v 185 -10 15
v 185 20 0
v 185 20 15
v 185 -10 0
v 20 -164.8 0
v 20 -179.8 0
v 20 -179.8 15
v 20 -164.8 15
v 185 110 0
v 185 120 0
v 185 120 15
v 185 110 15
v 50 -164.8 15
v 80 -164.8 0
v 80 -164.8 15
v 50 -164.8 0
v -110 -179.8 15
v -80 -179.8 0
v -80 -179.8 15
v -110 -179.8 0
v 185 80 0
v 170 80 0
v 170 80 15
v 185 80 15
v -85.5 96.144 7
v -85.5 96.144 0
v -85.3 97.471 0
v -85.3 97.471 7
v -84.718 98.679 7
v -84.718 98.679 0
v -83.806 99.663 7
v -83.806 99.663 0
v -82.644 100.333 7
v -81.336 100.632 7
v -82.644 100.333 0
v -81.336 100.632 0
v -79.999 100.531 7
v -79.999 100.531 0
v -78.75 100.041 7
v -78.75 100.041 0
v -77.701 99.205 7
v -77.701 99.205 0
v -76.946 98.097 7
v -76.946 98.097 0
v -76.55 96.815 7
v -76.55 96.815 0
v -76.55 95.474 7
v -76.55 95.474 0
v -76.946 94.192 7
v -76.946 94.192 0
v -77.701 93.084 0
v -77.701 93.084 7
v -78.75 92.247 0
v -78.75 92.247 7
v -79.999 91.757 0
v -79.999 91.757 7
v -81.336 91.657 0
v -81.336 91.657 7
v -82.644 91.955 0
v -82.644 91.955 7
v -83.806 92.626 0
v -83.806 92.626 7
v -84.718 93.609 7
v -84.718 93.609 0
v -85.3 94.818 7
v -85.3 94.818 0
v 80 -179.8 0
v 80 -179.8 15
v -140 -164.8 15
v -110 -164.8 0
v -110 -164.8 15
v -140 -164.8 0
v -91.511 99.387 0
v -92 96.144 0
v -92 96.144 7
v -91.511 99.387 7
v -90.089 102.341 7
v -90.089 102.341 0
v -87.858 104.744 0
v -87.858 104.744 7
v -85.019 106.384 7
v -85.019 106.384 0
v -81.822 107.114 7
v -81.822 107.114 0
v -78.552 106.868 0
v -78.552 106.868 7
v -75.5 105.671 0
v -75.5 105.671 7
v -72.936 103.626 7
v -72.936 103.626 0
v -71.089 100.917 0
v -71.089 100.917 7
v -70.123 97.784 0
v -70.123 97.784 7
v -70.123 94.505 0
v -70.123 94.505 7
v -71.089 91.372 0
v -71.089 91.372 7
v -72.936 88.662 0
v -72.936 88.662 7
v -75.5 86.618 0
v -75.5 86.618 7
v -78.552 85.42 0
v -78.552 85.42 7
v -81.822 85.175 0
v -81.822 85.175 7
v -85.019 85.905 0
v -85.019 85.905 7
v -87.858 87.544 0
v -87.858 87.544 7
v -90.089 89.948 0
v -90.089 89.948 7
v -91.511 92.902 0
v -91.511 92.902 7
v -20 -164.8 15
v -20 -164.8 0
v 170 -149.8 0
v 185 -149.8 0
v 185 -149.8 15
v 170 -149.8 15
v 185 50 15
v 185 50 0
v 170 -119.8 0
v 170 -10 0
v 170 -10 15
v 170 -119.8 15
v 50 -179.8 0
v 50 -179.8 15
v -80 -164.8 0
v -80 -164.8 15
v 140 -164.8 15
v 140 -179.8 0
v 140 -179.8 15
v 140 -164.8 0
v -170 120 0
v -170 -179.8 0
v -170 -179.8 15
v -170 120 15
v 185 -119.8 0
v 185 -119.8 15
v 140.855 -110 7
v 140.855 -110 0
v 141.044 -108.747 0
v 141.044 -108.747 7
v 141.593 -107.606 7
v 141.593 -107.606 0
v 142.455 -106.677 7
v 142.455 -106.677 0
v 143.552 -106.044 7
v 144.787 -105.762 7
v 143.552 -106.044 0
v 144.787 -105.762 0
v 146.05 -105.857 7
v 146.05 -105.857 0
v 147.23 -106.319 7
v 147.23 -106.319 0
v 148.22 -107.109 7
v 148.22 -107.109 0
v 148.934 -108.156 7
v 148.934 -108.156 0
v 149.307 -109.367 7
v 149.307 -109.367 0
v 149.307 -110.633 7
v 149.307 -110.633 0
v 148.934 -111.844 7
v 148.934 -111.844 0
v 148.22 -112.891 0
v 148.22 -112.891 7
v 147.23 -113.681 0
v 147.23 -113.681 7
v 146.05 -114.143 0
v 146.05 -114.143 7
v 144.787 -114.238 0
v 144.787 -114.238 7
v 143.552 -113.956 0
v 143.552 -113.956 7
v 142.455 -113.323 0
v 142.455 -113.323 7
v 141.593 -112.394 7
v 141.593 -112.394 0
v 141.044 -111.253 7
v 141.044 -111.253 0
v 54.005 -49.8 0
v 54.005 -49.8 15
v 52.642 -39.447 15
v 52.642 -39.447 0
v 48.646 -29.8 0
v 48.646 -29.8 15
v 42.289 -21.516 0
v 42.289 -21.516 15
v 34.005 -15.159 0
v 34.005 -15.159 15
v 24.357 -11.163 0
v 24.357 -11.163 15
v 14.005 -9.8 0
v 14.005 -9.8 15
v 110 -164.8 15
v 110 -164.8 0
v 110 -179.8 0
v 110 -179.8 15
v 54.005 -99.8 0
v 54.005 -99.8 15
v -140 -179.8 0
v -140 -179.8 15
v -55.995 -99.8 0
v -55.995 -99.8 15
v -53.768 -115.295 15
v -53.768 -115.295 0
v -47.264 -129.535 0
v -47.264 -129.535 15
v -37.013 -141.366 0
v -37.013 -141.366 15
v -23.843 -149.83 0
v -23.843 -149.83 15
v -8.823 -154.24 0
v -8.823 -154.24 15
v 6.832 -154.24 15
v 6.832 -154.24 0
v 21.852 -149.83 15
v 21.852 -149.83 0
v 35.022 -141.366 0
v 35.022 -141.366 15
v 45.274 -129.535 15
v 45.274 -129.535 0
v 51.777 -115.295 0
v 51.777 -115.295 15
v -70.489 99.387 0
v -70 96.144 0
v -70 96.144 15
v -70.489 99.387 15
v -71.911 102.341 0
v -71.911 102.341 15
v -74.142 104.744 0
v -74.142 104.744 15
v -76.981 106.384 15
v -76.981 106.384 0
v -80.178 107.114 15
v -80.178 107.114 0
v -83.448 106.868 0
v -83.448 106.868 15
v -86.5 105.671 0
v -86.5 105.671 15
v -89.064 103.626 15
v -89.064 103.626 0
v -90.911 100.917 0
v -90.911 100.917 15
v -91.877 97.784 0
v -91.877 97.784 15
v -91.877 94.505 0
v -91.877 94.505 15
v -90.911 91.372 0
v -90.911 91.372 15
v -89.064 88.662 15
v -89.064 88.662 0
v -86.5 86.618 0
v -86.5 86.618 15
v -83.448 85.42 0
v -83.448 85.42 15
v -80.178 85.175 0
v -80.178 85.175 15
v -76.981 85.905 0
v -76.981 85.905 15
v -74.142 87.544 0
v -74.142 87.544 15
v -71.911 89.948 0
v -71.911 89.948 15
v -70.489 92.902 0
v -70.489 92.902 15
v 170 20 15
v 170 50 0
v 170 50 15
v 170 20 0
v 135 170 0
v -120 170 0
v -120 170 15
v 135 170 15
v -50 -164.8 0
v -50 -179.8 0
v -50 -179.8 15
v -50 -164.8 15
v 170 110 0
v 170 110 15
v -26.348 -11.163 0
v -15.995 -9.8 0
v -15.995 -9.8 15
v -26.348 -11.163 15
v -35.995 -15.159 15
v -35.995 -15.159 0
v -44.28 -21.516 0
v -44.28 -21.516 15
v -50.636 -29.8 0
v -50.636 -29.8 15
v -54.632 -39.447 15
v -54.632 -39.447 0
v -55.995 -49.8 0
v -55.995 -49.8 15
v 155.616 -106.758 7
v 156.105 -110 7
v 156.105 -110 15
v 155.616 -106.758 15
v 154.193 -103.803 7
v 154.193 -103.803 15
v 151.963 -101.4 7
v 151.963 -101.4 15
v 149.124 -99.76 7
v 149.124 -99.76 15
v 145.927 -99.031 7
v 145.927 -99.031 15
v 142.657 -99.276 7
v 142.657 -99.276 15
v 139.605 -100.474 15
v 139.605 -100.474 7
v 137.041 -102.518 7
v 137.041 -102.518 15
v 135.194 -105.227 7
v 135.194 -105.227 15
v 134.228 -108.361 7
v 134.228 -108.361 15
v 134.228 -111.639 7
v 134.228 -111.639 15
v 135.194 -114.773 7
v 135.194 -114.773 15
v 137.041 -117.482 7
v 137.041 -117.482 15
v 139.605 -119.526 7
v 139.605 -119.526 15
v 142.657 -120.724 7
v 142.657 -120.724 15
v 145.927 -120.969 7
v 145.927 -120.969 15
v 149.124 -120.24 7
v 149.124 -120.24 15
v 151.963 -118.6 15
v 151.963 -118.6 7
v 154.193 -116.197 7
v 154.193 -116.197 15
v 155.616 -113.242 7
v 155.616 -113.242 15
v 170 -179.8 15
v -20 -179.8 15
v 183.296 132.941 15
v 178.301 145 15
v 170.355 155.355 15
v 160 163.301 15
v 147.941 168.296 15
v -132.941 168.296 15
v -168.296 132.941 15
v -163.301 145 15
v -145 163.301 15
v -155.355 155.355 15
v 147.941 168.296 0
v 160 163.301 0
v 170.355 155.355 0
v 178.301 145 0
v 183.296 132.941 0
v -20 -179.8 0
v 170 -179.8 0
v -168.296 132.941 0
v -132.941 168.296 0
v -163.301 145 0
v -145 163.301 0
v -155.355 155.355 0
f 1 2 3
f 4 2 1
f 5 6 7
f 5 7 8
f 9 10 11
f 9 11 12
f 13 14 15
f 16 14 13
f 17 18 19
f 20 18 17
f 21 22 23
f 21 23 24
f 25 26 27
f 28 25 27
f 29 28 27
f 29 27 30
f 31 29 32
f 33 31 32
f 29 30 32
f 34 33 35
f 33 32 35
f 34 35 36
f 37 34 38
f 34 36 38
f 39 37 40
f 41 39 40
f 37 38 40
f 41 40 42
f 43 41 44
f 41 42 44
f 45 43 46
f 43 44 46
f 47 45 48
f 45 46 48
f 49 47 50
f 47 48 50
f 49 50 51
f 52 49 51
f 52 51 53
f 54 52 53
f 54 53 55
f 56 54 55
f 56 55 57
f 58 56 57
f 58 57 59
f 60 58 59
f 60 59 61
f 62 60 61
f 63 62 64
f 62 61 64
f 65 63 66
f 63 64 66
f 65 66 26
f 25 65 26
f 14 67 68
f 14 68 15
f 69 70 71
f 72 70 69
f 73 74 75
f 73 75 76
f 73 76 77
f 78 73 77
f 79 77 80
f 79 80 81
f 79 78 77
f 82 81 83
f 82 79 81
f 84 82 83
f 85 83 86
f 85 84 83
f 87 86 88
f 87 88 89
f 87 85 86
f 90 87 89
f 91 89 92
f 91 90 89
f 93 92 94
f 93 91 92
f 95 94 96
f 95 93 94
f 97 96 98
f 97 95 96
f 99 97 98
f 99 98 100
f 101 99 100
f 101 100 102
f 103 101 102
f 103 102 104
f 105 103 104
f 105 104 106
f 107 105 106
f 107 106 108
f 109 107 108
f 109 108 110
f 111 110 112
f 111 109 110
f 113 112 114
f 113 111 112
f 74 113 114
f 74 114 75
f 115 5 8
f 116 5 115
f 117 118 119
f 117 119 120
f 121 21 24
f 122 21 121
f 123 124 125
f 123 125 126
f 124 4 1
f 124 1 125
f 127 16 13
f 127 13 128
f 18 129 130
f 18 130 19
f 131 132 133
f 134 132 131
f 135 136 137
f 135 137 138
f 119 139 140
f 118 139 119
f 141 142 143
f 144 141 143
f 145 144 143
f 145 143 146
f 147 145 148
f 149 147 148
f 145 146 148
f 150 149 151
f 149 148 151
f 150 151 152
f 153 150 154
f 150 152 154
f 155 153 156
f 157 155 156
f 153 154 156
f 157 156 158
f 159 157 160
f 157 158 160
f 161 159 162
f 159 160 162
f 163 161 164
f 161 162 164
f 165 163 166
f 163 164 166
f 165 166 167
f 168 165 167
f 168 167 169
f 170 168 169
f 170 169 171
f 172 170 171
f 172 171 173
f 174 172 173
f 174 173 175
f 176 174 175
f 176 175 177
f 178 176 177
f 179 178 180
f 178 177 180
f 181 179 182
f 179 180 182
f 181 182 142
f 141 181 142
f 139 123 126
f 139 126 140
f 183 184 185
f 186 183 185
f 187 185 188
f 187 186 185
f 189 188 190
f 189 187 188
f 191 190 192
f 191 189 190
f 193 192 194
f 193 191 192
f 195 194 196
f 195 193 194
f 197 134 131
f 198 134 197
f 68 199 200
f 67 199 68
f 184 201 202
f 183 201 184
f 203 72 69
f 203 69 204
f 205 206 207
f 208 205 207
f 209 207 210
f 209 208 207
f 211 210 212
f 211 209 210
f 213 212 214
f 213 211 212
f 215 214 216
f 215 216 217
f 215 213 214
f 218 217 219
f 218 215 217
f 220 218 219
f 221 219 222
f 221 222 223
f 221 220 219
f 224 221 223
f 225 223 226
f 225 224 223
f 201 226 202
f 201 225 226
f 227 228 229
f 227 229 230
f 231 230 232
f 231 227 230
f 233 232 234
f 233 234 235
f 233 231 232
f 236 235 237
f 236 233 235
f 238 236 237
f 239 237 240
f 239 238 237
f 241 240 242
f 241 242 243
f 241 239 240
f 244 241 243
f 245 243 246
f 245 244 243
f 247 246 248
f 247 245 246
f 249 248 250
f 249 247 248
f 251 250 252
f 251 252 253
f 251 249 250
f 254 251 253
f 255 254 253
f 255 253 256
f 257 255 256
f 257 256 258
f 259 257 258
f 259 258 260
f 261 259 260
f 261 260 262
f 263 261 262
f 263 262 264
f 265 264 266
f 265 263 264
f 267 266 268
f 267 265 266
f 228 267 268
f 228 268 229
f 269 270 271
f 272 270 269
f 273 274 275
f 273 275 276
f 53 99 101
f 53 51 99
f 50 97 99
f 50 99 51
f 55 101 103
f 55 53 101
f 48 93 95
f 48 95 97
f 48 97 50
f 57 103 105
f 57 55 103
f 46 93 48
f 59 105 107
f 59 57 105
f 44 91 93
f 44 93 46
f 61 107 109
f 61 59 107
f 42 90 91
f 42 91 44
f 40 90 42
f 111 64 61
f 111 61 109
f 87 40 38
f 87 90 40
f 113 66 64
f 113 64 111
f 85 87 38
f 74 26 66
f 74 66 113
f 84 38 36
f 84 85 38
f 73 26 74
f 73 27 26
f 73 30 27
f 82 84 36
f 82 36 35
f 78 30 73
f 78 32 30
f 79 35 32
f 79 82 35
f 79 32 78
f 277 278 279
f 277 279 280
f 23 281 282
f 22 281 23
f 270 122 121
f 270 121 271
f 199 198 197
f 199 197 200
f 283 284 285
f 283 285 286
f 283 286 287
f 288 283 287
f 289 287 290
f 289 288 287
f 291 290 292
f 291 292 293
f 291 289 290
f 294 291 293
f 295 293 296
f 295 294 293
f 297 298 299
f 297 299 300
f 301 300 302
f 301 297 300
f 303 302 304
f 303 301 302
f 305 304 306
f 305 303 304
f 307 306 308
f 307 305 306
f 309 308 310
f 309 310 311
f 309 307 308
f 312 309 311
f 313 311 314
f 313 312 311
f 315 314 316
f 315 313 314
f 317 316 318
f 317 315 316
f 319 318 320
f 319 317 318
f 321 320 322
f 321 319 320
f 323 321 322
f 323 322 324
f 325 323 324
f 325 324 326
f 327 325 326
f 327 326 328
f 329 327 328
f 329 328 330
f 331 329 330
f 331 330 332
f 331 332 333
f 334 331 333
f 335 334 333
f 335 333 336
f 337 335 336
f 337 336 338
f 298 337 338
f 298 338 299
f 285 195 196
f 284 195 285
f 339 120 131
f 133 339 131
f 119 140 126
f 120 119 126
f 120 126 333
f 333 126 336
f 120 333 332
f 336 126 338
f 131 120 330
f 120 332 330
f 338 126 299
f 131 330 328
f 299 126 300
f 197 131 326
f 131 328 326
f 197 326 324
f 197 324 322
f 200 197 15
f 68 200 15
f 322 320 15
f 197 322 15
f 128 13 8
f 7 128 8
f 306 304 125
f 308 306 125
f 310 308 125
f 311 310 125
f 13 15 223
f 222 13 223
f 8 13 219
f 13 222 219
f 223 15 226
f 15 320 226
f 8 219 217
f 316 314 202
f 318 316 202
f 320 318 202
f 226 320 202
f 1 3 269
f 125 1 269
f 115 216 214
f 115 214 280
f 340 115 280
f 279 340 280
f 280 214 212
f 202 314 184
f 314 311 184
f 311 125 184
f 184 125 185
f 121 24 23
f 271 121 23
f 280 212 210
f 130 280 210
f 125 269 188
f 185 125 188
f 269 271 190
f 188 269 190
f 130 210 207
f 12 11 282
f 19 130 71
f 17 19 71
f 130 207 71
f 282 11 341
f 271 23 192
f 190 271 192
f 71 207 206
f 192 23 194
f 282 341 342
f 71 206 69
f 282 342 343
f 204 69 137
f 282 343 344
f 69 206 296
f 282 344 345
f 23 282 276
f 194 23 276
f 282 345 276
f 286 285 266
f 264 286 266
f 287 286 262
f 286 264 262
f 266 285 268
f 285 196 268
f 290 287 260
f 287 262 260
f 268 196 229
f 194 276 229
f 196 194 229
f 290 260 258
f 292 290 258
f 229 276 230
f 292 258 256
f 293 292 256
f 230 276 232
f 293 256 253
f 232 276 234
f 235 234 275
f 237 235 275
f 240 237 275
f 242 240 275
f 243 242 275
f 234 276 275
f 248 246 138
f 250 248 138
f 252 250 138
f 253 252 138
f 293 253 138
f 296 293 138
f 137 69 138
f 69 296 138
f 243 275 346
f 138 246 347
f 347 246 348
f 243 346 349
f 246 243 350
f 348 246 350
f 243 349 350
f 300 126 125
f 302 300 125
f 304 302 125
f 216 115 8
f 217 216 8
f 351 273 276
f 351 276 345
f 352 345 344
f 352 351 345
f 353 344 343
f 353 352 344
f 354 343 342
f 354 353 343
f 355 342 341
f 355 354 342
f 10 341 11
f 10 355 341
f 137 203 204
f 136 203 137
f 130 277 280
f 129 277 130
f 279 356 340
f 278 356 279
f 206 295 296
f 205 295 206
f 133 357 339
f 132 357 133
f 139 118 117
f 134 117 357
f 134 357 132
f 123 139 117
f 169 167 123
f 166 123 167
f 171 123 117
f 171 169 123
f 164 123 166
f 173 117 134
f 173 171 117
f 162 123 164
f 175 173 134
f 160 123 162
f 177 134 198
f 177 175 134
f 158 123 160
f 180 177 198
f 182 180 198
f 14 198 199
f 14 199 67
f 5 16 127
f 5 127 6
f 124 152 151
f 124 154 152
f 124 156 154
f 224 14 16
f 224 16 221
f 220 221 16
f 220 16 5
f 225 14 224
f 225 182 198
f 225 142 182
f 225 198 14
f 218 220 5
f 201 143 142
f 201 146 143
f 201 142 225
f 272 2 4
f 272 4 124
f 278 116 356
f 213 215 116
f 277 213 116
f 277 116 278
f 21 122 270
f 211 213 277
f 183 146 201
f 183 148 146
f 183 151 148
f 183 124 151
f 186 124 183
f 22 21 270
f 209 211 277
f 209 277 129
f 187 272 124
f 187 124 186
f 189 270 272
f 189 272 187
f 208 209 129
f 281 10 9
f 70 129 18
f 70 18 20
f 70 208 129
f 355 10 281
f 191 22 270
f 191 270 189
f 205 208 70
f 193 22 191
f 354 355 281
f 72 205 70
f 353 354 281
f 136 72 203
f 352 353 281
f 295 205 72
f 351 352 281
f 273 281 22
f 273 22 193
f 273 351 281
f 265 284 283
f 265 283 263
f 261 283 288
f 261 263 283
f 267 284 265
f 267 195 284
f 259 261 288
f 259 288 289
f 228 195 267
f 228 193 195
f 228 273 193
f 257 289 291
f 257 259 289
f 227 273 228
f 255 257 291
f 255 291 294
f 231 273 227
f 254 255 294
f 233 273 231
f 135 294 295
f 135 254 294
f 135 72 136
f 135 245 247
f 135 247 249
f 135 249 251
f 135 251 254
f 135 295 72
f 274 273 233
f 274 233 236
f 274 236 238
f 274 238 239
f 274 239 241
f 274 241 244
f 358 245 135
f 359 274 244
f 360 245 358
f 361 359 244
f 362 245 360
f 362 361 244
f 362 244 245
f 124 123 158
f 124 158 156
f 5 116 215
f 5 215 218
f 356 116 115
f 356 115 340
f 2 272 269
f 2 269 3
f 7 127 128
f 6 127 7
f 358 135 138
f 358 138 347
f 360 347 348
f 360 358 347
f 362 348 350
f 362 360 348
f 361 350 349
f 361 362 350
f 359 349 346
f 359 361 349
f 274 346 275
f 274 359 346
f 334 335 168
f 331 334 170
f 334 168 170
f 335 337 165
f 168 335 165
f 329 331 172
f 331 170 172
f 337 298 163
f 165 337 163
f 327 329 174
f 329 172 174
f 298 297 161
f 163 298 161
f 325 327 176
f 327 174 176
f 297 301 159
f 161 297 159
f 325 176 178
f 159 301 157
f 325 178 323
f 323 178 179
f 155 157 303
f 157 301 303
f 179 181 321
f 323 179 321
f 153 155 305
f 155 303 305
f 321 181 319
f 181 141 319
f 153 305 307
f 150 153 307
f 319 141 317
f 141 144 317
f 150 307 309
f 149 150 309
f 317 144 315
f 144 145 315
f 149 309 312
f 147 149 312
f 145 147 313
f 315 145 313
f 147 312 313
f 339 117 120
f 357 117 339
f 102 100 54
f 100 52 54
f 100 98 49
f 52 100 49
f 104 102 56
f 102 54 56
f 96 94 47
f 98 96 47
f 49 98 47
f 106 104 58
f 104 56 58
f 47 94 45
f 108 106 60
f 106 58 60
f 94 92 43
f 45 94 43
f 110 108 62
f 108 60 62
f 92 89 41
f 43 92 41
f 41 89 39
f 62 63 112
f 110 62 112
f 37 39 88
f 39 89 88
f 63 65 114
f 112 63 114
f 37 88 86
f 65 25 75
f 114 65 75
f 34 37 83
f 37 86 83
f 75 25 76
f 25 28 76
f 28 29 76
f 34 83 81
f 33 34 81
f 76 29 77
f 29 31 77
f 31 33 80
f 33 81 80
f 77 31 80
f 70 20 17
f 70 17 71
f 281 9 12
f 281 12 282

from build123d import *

# Parameters (mm, degrees)
SKETCH1_R           = 11
BOSS_EXTRUDE1_DEPTH = 15
SKETCH4_R           = 11
SKETCH4_R_2         = 4.5
BOSS_EXTRUDE4_DEPTH = 7
SKETCH5_R           = 11
SKETCH5_R_2         = 4.25
BOSS_EXTRUDE5_DEPTH = 7


with BuildPart() as part:
    # Sketch1 → Boss-Extrude1 (new body)
    with BuildSketch(Plane.XY):
        with BuildLine():
            Line((-120, 170), (135, 170))
            ThreePointArc((135, 170), (170.355339059, 155.355339059), (185, 120))
            Line((185, 120), (185, 110))
            Line((185, 110), (170, 110))
            Line((170, 110), (170, 80))
            Line((170, 80), (185, 80))
            Line((185, 80), (185, 50))
            Line((185, 50), (170, 50))
            Line((170, 50), (170, 20))
            Line((170, 20), (185, 20))
            Line((185, 20), (185, -10))
            Line((185, -10), (170, -10))
            Line((170, -10), (170, -119.800029128))
            Line((170, -119.800029128), (185, -119.800029128))
            Line((185, -119.800029128), (185, -149.800029128))
            Line((185, -149.800029128), (170, -149.800029128))
            Line((170, -149.800029128), (170, -179.800029128))
            Line((170, -179.800029128), (140, -179.800029128))
            Line((140, -179.800029128), (140, -164.8))
            Line((140, -164.8), (110, -164.8))
            Line((110, -164.8), (110, -179.8))
            Line((110, -179.8), (80, -179.8))
            Line((80, -179.8), (80, -164.8))
            Line((80, -164.8), (50, -164.8))
            Line((50, -164.8), (50, -179.8))
            Line((50, -179.8), (20, -179.8))
            Line((20, -179.8), (20, -164.8))
            Line((20, -164.8), (-20, -164.8))
            Line((-20, -164.8), (-20, -179.8))
            Line((-20, -179.8), (-50, -179.8))
            Line((-50, -179.8), (-50, -164.8))
            Line((-50, -164.8), (-80, -164.8))
            Line((-80, -164.8), (-80, -179.8))
            Line((-80, -179.8), (-110, -179.8))
            Line((-110, -179.8), (-110, -164.8))
            Line((-110, -164.8), (-140, -164.8))
            Line((-140, -164.8), (-140, -179.8))
            Line((-140, -179.8), (-170, -179.8))
            Line((-170, -179.8), (-170, -170))
            Line((-170, -170), (-170, 120))
            ThreePointArc((-170, 120), (-155.355339059, 155.355339059), (-120, 170))
        make_face()
        with Locations((145.104779776, -110)):
            Circle(SKETCH1_R, mode=Mode.SUBTRACT)
        with Locations((-81, 96.144292568)):
            Circle(SKETCH1_R, mode=Mode.SUBTRACT)
        with BuildLine():
            Line((-55.995398281, -49.8), (-55.995398281, -99.8))
            ThreePointArc((-55.995398281, -99.8), (-0.995398281, -154.8), (54.004601719, -99.8))
            Line((54.004601719, -99.8), (54.004601719, -49.8))
            ThreePointArc((54.004601719, -49.8), (42.288872967, -21.515728753), (14.004601719, -9.8))
            Line((14.004601719, -9.8), (-15.995398281, -9.8))
            ThreePointArc((-15.995398281, -9.8), (-44.279669528, -21.515728753), (-55.995398281, -49.8))
        make_face(mode=Mode.SUBTRACT)
    extrude(amount=BOSS_EXTRUDE1_DEPTH)

    # Sketch5 → Boss-Extrude5 (add)
    with BuildSketch(Plane(origin=(0, 0, 0), x_dir=(-1, 0, 0), z_dir=(0, 0, -1))):
        with Locations((-145.104779776, -110)):
            Circle(SKETCH5_R)
        with Locations((-145.104779776, -110)):
            Circle(SKETCH5_R_2, mode=Mode.SUBTRACT)
    extrude(amount=-BOSS_EXTRUDE5_DEPTH)


with BuildPart() as body_2:
    # Sketch4 → Boss-Extrude4 (new body)
    with BuildSketch(Plane(origin=(0, 0, 0), x_dir=(-1, 0, 0), z_dir=(0, 0, -1))):
        with Locations((81, 96.144292568)):
            Circle(SKETCH4_R)
        with Locations((81, 96.144292568)):
            Circle(SKETCH4_R_2, mode=Mode.SUBTRACT)
    extrude(amount=-BOSS_EXTRUDE4_DEPTH)


solid = Compound([part.part, body_2.part])
